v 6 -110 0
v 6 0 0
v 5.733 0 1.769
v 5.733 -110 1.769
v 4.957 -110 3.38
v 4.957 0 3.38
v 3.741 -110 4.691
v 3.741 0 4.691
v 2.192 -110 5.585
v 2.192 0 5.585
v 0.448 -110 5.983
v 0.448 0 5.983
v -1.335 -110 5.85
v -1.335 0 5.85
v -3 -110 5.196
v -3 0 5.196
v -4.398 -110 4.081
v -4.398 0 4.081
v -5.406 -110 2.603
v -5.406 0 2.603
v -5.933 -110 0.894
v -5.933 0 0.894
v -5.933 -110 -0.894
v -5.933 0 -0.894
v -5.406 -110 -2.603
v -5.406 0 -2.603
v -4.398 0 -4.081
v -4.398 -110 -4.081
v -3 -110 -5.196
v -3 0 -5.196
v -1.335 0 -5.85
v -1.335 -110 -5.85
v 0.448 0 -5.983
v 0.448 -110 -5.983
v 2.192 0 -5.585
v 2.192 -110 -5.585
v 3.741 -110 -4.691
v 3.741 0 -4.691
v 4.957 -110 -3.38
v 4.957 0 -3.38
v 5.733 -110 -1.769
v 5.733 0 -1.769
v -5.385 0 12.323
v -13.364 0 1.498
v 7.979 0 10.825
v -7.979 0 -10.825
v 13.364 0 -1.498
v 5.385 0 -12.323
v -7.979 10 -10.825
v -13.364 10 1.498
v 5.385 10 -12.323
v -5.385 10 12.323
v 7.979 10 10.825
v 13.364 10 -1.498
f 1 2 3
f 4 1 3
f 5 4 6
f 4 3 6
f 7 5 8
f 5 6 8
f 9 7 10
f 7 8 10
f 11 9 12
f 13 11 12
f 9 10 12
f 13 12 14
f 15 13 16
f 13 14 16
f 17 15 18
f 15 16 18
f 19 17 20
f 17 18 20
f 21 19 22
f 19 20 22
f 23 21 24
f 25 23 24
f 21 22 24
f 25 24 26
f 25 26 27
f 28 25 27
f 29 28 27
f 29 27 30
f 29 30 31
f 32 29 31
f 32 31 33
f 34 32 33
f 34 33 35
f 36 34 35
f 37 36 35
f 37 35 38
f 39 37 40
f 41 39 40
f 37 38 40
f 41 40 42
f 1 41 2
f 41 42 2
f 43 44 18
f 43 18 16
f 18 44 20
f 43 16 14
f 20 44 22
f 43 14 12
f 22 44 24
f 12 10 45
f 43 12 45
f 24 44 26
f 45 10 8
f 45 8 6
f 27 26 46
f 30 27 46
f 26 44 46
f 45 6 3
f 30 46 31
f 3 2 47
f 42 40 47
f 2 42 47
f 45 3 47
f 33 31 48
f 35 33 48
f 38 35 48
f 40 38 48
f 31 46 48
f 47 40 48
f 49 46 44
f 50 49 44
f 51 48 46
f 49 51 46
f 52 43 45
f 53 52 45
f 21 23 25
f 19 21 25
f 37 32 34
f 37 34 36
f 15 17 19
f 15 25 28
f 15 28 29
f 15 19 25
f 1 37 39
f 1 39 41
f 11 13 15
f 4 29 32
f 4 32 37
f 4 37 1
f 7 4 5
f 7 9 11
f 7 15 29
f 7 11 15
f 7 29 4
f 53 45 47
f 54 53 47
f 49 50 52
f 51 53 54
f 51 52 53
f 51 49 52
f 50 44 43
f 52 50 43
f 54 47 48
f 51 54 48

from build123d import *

# Parameters (mm, degrees)
BOSS_EXTRUDE1_DEPTH = 10
SKETCH2_R           = 6
BOSS_EXTRUDE2_DEPTH = 110


with BuildPart() as part:
    # Sketch1 → Boss-Extrude1 (new body)
    with BuildSketch(Plane(origin=(0, 0, 0), x_dir=(1, 0, 0), z_dir=(0, 1, 0))):
        Polygon((7.979415777, -10.824700142), (13.3641732, 1.498026699), (5.384757423, 12.322726841), (-7.979415777, 10.824700142), (-13.3641732, -1.498026699), (-5.384757423, -12.322726841), align=None)
    extrude(amount=BOSS_EXTRUDE1_DEPTH)

    # Sketch2 → Boss-Extrude2 (add)
    with BuildSketch(Plane.XZ):
        Circle(SKETCH2_R)
    extrude(amount=BOSS_EXTRUDE2_DEPTH)


solid = part.part
